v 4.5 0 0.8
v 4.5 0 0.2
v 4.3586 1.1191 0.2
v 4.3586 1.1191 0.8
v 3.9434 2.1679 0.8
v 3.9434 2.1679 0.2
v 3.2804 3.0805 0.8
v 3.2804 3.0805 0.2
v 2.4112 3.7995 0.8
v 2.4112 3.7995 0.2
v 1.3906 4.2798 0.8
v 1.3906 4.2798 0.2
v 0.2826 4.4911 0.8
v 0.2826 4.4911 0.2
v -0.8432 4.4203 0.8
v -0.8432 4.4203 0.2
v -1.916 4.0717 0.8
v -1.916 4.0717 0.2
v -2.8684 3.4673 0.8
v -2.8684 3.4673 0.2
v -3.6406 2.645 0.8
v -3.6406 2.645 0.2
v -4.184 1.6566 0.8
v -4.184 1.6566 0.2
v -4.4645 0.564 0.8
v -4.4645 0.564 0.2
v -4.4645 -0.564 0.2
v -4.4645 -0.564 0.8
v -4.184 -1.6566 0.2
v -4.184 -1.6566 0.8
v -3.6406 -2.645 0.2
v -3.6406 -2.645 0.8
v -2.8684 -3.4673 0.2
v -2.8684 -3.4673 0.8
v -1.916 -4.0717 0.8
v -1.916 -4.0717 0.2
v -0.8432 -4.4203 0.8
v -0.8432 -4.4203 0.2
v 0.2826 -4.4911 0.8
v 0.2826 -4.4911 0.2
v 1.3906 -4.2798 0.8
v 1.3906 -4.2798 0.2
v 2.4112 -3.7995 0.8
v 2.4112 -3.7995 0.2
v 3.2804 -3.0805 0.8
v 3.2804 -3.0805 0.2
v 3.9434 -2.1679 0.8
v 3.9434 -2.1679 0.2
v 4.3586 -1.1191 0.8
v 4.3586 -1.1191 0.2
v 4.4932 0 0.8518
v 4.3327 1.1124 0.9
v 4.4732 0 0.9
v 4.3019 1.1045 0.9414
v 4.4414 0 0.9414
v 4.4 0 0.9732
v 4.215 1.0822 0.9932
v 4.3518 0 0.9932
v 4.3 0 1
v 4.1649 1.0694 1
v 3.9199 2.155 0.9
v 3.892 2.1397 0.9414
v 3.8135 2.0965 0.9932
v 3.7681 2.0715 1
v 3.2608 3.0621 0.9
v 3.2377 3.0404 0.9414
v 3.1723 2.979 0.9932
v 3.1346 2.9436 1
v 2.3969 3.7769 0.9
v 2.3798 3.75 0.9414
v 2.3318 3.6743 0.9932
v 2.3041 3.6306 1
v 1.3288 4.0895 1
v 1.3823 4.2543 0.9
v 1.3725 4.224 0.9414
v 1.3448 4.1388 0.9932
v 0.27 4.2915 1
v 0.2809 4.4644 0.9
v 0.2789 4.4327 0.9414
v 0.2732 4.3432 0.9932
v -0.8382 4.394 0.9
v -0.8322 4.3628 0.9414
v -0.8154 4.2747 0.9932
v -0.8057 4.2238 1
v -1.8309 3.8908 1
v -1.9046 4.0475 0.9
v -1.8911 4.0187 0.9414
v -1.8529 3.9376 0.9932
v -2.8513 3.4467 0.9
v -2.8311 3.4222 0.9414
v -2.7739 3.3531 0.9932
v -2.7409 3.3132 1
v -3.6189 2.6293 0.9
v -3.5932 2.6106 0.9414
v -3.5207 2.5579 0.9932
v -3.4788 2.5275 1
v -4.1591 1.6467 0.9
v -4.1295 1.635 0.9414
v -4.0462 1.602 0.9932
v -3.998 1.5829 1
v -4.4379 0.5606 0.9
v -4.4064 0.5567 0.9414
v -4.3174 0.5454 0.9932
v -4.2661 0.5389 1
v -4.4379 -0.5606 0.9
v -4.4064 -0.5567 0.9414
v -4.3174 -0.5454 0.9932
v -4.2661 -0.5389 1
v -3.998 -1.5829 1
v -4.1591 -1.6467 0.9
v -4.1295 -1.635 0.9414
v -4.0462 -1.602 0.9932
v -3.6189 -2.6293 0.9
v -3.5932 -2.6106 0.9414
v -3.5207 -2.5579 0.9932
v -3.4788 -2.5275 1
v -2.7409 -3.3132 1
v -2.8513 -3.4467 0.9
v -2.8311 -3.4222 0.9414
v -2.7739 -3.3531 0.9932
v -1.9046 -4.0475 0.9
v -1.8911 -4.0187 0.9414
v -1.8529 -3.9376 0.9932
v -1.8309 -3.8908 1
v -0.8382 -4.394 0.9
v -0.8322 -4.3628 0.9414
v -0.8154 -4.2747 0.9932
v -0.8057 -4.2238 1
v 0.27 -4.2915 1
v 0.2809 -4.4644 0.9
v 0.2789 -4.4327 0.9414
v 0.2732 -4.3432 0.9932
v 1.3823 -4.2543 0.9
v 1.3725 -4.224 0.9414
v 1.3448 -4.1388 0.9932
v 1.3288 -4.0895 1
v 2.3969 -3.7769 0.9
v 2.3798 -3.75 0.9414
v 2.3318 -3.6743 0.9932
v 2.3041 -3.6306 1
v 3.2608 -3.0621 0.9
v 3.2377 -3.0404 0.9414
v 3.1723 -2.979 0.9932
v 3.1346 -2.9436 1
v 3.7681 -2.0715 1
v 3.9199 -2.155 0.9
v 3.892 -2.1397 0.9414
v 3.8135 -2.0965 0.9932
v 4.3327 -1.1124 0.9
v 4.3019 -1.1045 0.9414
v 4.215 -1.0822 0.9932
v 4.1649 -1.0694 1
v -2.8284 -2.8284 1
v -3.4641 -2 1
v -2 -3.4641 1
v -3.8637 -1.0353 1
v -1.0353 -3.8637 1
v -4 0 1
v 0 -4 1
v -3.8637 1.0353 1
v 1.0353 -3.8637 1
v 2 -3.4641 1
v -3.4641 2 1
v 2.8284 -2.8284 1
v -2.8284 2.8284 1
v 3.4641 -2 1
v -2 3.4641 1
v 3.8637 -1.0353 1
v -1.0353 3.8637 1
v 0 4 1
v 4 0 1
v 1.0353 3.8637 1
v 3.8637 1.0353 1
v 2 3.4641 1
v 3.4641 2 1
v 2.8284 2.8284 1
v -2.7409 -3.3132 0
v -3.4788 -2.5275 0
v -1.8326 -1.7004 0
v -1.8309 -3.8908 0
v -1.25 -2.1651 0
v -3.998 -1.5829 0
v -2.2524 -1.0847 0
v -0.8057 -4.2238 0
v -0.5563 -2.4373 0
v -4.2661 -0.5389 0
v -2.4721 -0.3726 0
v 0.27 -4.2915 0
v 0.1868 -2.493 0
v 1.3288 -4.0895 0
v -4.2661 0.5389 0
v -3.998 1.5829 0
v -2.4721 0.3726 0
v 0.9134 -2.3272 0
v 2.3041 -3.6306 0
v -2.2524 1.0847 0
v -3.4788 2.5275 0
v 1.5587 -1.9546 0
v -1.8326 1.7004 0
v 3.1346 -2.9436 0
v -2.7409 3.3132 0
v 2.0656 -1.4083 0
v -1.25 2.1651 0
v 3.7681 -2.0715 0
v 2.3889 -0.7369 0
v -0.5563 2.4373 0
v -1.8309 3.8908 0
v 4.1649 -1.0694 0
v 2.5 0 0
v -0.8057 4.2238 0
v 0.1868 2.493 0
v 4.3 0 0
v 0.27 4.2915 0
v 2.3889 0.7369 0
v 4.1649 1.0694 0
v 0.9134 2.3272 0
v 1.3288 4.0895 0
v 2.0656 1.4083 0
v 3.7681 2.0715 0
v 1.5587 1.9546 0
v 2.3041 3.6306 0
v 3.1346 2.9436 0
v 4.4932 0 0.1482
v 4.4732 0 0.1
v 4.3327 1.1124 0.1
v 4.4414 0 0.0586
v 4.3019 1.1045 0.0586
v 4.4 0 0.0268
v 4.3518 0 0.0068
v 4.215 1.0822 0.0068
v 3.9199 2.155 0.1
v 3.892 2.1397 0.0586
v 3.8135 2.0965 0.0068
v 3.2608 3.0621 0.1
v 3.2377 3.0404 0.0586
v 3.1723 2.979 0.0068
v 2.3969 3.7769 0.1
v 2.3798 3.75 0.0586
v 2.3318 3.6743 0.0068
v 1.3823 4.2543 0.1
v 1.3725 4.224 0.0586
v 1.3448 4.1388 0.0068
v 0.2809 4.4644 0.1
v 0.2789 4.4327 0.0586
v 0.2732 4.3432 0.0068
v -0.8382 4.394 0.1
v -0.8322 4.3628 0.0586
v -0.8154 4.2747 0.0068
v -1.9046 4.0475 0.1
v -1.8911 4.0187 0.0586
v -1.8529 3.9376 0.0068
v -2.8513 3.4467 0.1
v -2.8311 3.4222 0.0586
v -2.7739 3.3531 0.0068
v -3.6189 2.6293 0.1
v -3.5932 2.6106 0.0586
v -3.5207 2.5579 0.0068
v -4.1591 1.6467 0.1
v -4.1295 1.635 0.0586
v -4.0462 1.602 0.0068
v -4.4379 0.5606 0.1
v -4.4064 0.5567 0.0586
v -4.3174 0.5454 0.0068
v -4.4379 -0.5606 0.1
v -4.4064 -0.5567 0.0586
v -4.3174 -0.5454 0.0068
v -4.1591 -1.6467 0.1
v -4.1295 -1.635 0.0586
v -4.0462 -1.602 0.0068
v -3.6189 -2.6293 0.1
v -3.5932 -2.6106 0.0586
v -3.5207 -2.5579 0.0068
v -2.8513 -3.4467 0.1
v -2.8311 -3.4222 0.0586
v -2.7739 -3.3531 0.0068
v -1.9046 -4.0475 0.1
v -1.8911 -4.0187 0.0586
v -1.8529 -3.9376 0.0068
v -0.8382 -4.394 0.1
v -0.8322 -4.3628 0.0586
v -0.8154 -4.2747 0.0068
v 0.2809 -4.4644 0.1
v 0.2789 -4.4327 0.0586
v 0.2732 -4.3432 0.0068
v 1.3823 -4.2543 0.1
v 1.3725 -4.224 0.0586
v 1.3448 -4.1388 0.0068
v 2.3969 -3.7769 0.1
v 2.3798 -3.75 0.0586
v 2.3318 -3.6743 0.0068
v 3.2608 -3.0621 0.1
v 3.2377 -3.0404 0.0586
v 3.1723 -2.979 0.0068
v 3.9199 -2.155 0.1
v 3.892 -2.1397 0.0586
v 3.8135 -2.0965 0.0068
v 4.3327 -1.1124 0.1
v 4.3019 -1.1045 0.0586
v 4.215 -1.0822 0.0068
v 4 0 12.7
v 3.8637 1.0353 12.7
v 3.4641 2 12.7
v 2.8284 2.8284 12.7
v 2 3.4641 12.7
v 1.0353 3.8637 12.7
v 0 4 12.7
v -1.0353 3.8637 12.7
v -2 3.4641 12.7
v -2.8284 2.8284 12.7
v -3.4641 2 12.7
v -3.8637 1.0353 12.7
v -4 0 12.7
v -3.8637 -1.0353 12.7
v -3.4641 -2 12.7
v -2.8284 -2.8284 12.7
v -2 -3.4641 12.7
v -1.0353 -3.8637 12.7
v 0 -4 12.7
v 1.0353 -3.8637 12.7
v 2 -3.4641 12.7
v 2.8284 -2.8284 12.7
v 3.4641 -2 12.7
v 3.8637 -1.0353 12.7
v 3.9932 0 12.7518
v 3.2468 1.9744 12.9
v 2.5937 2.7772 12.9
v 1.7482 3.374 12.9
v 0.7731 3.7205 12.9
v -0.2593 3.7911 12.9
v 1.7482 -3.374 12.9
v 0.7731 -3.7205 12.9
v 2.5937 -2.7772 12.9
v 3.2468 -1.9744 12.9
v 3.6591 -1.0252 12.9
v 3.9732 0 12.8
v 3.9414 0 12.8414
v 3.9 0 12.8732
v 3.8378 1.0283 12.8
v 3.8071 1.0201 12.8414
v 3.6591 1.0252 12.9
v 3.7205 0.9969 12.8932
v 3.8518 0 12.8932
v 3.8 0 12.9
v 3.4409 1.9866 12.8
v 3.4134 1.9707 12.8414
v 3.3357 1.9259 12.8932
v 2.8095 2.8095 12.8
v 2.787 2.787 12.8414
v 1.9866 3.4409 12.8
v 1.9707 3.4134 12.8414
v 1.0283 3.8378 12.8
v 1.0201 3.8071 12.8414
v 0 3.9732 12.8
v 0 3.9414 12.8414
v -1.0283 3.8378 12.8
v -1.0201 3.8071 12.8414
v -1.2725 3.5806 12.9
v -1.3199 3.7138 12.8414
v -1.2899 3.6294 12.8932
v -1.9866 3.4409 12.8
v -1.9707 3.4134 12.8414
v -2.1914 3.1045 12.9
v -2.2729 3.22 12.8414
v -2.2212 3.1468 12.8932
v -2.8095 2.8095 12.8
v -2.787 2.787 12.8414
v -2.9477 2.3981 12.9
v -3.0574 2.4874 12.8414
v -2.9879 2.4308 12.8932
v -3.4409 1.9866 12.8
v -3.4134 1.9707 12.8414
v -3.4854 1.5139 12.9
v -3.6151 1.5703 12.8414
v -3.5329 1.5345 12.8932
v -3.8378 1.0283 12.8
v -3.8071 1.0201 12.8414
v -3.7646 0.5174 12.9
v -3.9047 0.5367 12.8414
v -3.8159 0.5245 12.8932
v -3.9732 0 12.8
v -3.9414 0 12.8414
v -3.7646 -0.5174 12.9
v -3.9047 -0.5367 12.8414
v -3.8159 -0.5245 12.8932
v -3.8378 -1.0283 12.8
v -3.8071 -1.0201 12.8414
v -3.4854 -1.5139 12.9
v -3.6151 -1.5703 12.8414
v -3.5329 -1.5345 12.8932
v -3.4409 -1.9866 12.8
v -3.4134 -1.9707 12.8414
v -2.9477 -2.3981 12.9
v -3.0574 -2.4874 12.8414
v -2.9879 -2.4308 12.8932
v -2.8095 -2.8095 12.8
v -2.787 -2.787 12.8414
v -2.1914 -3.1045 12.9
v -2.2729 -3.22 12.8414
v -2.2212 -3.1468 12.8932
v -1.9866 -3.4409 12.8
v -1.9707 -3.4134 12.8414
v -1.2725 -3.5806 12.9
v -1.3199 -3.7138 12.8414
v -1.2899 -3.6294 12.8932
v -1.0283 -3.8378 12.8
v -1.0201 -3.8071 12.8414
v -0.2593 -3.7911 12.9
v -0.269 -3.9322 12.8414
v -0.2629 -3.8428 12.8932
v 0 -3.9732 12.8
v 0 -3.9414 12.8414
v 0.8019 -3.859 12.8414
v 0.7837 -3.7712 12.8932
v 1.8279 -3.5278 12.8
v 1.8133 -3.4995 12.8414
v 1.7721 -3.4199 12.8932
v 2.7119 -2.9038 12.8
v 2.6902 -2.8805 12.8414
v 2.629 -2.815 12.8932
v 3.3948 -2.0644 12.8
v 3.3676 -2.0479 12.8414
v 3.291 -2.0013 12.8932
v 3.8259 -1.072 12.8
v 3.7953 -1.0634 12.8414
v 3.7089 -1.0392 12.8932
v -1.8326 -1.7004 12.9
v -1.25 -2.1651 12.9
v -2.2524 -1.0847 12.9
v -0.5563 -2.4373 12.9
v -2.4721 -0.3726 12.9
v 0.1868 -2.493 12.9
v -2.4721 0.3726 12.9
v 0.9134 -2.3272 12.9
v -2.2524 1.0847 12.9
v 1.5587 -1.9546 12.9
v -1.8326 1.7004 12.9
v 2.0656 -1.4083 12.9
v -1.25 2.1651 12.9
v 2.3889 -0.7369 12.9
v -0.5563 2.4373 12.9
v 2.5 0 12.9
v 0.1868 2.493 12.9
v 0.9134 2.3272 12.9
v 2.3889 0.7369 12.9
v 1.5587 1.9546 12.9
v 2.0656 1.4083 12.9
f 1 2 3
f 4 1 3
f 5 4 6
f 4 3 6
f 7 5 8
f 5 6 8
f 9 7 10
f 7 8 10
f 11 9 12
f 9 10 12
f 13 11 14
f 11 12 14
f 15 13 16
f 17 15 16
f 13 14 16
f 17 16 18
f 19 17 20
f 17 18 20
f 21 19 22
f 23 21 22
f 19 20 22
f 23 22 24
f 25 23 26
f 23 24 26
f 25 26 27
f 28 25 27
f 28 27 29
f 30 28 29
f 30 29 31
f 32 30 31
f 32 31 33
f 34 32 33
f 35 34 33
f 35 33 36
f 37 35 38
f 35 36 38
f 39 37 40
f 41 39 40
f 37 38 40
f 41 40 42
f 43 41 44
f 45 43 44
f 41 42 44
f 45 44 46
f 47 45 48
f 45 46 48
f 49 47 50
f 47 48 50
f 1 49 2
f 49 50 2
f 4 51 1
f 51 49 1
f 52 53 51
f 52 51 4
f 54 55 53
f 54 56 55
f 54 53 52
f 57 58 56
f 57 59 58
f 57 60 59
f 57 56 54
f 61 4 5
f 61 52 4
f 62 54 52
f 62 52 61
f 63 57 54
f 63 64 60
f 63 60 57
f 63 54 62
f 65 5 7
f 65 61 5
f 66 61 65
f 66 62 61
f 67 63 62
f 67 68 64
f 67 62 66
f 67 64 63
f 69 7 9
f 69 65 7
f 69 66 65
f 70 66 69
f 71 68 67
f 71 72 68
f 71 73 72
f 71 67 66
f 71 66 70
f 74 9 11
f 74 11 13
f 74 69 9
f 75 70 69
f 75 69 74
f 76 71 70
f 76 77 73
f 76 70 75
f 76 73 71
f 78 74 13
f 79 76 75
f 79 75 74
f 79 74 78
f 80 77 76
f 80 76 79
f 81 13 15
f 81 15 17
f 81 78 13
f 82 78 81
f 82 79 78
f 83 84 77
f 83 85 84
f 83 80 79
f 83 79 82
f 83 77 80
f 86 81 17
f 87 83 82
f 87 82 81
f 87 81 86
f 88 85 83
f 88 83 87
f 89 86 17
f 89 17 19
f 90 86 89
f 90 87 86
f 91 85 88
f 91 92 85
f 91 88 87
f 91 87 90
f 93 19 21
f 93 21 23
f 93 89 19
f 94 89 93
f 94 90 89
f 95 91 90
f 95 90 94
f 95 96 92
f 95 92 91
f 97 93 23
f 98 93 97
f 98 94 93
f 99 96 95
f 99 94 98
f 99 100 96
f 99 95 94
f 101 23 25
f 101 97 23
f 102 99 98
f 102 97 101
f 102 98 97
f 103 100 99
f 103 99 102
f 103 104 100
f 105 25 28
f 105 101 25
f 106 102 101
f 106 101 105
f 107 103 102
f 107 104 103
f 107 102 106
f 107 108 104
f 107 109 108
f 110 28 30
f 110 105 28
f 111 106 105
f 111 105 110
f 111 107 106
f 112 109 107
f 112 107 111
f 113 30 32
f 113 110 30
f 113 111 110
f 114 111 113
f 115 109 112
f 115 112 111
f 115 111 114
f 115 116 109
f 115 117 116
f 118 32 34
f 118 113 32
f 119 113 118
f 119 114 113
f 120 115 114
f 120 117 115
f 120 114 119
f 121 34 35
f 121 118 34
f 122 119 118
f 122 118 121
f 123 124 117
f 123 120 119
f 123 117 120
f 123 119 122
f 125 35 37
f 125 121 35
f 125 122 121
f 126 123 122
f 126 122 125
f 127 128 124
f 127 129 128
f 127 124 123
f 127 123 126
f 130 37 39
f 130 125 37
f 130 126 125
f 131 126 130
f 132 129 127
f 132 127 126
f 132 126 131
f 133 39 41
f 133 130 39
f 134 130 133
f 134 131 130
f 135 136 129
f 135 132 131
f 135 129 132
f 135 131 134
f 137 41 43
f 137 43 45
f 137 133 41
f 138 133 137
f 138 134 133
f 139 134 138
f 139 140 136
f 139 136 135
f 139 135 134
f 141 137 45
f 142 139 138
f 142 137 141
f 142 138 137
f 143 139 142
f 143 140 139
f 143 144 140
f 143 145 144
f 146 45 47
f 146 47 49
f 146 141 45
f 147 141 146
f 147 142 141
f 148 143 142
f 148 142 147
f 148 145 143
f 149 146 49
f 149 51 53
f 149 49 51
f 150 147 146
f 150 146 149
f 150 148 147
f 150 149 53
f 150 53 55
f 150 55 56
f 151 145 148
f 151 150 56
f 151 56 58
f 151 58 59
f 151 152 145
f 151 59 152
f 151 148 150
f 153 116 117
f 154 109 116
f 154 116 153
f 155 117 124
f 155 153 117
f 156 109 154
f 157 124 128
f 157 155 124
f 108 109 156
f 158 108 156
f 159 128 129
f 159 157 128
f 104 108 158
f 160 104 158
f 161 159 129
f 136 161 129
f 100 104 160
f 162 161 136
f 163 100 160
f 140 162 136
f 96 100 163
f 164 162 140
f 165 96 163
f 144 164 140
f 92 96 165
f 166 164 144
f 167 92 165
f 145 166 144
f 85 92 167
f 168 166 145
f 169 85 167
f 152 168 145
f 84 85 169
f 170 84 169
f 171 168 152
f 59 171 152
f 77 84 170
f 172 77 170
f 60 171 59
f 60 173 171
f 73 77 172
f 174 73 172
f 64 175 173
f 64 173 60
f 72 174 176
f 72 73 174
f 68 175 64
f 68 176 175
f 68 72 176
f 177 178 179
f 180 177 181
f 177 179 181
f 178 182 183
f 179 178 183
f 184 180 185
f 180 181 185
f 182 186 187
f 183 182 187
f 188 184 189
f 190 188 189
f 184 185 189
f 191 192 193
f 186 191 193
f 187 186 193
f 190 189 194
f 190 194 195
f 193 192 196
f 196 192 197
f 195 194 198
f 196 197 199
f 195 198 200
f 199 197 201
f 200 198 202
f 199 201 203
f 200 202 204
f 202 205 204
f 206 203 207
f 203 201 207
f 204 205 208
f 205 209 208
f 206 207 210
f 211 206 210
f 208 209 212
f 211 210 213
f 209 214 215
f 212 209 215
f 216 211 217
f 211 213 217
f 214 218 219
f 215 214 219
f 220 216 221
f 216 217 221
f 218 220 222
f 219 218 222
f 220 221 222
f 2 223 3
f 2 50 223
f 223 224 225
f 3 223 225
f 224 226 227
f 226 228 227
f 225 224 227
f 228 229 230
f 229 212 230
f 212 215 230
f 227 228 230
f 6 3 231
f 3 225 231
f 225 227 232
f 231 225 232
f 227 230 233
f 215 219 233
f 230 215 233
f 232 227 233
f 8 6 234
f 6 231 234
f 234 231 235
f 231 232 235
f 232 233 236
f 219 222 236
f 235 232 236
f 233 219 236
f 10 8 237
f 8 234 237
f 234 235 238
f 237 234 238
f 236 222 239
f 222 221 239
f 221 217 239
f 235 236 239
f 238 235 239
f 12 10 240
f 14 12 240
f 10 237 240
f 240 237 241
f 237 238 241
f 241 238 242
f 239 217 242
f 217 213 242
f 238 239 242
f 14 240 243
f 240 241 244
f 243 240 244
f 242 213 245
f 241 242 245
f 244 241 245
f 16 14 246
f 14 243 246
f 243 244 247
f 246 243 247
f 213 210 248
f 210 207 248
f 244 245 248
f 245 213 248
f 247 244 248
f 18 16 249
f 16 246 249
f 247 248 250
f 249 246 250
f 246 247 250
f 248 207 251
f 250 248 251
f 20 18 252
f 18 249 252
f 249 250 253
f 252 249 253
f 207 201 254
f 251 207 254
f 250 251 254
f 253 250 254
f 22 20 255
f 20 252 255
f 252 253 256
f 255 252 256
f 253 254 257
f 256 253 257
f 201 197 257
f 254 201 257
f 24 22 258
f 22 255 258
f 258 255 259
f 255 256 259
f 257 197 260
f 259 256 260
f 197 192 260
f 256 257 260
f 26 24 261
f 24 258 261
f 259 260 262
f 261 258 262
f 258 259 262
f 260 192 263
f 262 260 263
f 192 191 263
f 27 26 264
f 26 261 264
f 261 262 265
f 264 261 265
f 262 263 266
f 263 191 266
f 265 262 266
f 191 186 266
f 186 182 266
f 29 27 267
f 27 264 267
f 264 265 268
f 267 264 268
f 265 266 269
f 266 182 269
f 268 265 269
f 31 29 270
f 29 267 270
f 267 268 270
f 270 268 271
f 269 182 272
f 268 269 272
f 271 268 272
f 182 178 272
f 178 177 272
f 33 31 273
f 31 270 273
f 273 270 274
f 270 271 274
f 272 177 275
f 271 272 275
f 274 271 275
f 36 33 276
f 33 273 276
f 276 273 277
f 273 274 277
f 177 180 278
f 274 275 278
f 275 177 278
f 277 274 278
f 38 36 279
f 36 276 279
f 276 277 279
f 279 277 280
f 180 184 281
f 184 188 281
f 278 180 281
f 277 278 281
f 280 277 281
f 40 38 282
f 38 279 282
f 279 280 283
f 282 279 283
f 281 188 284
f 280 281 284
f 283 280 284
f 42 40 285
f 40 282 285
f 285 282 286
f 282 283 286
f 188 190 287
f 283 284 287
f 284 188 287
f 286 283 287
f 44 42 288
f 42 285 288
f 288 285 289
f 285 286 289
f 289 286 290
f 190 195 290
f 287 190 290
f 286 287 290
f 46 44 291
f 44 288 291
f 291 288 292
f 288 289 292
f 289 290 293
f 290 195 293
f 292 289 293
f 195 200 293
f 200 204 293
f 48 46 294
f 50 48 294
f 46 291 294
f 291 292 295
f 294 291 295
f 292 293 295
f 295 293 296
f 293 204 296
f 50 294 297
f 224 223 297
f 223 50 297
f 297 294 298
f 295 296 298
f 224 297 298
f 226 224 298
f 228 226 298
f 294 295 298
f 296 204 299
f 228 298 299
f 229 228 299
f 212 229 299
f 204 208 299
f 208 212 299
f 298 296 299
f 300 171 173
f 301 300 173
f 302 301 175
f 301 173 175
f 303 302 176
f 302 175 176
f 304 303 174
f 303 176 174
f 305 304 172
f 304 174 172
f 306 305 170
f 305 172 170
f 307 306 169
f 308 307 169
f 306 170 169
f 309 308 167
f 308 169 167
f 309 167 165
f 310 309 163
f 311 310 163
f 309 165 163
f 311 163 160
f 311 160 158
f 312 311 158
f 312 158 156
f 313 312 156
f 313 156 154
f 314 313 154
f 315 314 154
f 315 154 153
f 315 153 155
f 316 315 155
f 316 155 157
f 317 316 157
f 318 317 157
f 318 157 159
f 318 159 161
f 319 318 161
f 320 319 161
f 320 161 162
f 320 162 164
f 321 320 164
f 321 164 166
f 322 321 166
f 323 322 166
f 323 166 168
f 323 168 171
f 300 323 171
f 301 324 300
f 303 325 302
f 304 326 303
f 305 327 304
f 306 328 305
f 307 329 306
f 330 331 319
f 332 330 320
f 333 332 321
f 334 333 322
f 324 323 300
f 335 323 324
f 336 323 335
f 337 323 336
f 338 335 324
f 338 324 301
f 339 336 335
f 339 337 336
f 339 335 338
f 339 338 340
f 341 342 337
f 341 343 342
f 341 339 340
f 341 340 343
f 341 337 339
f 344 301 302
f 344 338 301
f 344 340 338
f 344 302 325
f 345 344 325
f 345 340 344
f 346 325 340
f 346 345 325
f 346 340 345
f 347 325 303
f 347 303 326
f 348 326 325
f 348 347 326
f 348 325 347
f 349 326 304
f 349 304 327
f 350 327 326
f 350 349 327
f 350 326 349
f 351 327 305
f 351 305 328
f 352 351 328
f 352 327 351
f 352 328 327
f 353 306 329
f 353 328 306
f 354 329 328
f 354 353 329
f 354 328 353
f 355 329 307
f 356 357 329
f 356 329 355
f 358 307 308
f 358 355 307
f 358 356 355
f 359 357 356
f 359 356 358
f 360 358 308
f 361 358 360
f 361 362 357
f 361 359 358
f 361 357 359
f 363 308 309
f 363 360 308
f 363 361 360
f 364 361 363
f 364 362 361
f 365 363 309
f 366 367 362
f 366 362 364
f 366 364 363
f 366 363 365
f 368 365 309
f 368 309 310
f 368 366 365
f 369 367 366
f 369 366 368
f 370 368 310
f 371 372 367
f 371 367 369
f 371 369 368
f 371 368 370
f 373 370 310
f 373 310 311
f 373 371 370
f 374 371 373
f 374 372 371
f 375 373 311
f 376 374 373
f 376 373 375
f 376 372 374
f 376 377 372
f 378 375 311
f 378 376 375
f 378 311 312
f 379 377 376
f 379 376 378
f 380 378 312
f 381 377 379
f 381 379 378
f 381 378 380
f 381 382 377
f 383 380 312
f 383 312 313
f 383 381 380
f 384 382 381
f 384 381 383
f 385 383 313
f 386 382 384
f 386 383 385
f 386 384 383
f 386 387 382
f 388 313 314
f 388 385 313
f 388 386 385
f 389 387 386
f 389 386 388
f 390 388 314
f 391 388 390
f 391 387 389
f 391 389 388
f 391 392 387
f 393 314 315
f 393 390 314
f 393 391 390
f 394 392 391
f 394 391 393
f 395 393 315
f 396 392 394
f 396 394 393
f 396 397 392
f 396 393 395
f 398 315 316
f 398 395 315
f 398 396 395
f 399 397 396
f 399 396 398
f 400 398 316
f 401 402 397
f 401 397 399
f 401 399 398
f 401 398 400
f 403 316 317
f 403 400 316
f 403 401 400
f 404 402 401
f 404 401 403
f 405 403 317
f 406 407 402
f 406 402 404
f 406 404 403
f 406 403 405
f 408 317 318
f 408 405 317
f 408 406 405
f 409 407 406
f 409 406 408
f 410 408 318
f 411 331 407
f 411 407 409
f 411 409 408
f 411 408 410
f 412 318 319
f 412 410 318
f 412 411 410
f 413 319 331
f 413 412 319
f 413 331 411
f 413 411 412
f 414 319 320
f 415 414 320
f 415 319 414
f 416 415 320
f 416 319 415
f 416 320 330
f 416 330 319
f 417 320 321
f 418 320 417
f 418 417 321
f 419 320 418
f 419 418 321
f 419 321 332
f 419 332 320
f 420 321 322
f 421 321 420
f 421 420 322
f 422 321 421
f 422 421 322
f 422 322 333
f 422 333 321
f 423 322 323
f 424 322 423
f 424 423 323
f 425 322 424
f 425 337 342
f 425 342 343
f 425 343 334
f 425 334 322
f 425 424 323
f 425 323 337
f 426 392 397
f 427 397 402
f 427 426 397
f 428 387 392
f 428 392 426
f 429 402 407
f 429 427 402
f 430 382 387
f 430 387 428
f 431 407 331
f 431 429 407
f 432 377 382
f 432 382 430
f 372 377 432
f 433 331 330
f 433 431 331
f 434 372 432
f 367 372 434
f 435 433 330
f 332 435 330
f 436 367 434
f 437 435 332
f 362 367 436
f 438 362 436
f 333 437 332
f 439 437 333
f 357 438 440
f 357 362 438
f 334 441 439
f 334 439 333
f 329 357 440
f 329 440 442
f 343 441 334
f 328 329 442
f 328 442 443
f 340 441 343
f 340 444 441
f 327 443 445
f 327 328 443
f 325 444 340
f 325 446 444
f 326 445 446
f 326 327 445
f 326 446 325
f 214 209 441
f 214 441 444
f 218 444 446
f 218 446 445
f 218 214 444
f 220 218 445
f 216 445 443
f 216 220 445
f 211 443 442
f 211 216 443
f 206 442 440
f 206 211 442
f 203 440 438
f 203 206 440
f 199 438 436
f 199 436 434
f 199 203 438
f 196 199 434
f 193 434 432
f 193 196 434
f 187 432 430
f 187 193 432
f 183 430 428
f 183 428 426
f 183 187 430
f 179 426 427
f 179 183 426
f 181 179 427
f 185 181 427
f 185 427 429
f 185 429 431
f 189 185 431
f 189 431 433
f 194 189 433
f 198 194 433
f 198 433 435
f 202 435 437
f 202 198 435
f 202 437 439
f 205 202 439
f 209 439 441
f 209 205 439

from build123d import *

# Parameters (mm, degrees)
F0_R     = 4.5
F0_R_2   = 4
F1_DEPTH = 1
F0_R_3   = 2.5
F2_DEPTH = 12.9
F3_R     = 0.2
F4_R     = 0.2
F5_R     = 0.2


with BuildPart() as f1:
    # F0 (on Top) → F1 (new body)
    with BuildSketch(Plane.XY):
        Circle(F0_R)
        Circle(F0_R_2, mode=Mode.SUBTRACT)
    extrude(amount=F1_DEPTH)

    # F0 (on Top) → F2 (join)
    with BuildSketch(Plane.XY):
        Circle(F0_R_2)
        Circle(F0_R_3, mode=Mode.SUBTRACT)
    extrude(amount=F2_DEPTH)

    # F3
    f3_edges = [f1.edges().sort_by_distance(p)[0] for p in [
        (-4.5, 0, 0),
    ]]
    fillet(f3_edges, radius=F3_R)

    # F4
    f4_edges = [f1.edges().sort_by_distance(p)[0] for p in [
        (-4.5, 0, 1),
    ]]
    fillet(f4_edges, radius=F4_R)

    # F5
    f5_edges = [f1.edges().sort_by_distance(p)[0] for p in [
        (-4, 0, 12.9),
    ]]
    fillet(f5_edges, radius=F5_R)


solid = f1.part
